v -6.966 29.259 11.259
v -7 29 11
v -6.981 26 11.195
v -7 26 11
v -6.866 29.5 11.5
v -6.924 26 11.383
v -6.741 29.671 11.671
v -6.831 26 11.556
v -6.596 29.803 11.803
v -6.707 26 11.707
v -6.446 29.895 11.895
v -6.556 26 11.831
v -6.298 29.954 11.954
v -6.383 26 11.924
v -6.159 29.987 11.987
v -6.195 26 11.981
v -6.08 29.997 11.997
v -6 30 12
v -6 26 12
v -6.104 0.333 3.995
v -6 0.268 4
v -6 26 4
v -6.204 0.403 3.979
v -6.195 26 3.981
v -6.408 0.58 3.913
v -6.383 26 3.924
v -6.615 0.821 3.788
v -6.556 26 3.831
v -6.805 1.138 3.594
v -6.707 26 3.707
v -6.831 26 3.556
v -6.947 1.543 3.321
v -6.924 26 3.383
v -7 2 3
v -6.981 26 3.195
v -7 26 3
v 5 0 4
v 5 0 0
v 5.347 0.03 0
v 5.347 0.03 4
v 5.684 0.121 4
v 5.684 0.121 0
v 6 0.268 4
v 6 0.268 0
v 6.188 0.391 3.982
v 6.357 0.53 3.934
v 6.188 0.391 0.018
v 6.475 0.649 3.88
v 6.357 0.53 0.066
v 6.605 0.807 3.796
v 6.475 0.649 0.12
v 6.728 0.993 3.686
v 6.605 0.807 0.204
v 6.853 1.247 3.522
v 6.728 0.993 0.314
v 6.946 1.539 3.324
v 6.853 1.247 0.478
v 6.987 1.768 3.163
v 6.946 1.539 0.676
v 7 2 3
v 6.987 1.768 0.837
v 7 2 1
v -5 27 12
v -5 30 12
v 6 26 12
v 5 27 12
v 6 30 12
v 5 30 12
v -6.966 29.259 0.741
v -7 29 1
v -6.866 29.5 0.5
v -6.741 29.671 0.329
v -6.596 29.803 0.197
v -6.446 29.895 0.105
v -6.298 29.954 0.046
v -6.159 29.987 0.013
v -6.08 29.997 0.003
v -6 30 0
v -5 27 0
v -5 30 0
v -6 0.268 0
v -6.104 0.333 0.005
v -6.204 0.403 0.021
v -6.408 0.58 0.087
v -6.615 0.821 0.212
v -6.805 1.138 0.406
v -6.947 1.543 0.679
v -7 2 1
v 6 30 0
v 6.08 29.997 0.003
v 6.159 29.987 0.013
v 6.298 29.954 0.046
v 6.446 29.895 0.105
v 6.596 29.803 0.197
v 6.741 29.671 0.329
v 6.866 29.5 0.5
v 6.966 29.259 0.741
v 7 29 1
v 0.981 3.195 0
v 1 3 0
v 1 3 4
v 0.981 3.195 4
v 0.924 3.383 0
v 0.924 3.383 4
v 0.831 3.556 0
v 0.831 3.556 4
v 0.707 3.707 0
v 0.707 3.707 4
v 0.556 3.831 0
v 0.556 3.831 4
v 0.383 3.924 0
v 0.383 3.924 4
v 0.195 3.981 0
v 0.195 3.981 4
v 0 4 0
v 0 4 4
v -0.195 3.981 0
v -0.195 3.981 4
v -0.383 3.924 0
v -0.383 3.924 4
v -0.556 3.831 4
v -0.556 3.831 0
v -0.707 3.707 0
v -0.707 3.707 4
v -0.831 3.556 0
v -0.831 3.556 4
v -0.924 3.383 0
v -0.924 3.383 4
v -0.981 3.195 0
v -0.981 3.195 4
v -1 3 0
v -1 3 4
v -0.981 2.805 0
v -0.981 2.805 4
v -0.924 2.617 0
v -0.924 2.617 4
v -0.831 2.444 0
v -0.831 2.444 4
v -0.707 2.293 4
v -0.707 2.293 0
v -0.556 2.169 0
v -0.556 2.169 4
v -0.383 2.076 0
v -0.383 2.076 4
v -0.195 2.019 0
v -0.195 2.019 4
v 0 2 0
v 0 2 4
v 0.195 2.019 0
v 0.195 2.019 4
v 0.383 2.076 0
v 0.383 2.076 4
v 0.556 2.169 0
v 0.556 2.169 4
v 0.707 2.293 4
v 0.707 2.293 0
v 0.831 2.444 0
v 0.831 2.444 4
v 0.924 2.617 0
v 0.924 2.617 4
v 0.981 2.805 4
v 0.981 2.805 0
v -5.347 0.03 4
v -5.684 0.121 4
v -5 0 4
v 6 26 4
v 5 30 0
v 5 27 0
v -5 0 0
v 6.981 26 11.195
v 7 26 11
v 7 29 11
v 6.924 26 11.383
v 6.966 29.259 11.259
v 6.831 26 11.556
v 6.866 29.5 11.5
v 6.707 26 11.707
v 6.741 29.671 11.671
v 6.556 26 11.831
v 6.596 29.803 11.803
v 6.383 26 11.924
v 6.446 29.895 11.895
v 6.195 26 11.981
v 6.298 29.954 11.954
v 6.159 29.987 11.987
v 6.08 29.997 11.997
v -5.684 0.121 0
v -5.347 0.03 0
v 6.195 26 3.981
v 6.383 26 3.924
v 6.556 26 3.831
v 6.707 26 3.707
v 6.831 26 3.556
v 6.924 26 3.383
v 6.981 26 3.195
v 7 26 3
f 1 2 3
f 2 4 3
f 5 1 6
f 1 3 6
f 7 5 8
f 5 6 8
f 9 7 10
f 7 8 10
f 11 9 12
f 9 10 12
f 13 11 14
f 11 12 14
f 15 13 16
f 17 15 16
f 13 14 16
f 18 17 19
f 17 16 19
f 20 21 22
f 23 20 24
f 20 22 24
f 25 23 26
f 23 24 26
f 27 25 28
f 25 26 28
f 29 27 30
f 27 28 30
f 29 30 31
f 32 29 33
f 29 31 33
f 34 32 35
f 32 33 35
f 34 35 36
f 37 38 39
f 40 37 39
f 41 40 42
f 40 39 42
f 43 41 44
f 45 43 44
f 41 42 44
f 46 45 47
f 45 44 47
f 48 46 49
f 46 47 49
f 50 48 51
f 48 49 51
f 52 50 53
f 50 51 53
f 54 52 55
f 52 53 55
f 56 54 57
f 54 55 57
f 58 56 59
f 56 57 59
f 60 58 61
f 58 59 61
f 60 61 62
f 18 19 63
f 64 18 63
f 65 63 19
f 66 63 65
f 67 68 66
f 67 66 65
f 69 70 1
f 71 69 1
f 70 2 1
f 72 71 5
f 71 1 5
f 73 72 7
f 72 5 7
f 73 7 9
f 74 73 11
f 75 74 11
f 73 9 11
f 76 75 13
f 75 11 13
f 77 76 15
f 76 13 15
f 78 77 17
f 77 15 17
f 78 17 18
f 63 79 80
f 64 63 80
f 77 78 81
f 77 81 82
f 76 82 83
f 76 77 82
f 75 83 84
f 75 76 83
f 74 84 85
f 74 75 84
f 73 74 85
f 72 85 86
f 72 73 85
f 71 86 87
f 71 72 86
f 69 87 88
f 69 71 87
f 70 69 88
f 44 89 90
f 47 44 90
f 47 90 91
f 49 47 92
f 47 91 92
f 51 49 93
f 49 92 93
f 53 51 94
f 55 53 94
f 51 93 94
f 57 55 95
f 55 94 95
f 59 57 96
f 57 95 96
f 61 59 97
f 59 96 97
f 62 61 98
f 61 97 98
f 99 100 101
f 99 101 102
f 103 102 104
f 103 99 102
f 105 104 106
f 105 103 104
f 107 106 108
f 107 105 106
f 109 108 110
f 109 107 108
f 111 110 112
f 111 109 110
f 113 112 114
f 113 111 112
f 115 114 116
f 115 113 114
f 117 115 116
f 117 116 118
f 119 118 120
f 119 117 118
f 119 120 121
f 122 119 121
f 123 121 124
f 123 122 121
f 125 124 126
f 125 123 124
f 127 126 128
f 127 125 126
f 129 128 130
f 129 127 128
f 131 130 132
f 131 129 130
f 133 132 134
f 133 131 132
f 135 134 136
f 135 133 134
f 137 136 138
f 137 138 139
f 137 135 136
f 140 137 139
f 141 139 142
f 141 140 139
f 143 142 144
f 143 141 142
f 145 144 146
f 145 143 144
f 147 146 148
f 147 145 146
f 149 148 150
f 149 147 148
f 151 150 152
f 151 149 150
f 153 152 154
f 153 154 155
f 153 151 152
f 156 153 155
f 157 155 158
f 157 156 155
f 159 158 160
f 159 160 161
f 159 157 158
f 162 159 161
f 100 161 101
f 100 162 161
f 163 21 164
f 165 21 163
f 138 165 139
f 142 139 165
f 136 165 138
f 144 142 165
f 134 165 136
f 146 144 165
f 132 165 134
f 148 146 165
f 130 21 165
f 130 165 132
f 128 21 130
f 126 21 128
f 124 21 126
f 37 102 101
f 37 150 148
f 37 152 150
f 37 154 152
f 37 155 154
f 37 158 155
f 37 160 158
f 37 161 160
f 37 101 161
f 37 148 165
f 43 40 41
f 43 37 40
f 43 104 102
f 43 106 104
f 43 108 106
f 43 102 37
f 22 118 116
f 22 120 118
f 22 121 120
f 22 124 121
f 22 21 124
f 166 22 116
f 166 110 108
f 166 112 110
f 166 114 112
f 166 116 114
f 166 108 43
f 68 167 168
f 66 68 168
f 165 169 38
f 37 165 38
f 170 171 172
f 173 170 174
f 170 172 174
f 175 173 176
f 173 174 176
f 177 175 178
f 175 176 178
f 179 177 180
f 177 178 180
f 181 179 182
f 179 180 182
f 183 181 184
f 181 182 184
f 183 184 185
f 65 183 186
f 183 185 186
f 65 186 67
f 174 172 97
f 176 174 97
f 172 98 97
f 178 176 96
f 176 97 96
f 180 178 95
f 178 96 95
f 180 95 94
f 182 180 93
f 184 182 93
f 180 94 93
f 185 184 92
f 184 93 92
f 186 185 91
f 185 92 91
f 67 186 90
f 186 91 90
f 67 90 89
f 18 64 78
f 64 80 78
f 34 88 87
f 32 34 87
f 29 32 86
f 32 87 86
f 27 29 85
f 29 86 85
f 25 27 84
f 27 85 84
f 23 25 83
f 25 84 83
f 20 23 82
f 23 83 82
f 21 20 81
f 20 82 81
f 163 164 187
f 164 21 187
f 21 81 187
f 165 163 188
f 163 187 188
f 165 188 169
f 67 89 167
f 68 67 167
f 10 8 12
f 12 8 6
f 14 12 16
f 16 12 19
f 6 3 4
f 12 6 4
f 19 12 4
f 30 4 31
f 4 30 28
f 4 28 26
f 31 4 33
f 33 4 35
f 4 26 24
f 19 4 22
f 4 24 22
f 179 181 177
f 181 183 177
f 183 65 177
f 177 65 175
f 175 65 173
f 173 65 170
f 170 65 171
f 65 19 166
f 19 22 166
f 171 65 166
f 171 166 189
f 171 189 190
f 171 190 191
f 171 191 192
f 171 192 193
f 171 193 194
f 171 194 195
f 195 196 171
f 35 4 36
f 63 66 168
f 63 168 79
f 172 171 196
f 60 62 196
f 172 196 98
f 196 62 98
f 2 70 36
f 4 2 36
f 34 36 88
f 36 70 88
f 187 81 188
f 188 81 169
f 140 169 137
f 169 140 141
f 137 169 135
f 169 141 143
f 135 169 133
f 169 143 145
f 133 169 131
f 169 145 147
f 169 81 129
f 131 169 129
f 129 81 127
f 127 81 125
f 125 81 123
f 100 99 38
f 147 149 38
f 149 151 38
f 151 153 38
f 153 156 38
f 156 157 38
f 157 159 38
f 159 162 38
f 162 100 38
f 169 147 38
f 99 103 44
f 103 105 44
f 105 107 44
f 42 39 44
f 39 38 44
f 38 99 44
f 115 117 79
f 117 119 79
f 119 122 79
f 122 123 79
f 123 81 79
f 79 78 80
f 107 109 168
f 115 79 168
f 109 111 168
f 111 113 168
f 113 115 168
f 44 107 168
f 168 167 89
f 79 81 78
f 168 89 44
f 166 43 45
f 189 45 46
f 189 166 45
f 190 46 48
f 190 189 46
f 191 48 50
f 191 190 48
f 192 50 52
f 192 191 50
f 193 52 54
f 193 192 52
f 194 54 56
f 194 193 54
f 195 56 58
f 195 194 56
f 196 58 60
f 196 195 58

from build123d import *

# Parameters (mm, degrees)
F0_W        = 14
F0_H        = 30
F0_R        = 1
F1_DEPTH    = 4
F3_DEPTH    = 8
F4_DEPTH    = 4.001
F5_R        = 1
F6_T1_DEPTH = 12


# Not quite as in the source:
# - a fillet or chamfer that OpenCascade refuses, or shapes differently, is made with other operations: its cross-section is extruded or revolved along the edge and cut away or added


with BuildPart() as f1:
    # F0 (on Top) → F1 (new body)
    with BuildSketch(Plane.XY):
        with Locations((0, 15)):
            Rectangle(F0_W, F0_H)
        with Locations((0, 3)):
            Circle(F0_R, mode=Mode.SUBTRACT)
    extrude(amount=F1_DEPTH)

    # F2 (on face) → F3 (join)
    with BuildSketch(Plane.XY.offset(4)):
        Polygon((-5, 27), (-5, 30), (-7, 30), (-7, 26), (7, 26), (7, 30), (5, 30), (5, 27), align=None)
    extrude(amount=F3_DEPTH)

    # F4 (cut, through all): a face of the model
    f4_faces = [f1.faces().sort_by_distance(p)[0] for p in [
        (0, 28.5, 4),
    ]]
    extrude(f4_faces, amount=-F4_DEPTH, mode=Mode.SUBTRACT)

    # F5
    f5_edges = [f1.edges().sort_by_distance(p)[0] for p in [
        (-7, 30, 6),
        (7, 30, 6),
        (-7, 28, 12),
        (7, 28, 12),
        (7, 15, 0),
        (-7, 15, 0),
        (-7, 13, 4),
        (7, 13, 4),
    ]]
    fillet(f5_edges, radius=F5_R)

    # F6: fillet of radius 2 on 2 edges, made by hand

    # F6_s2 → F6_t1 (cut)
    with BuildSketch(Plane.XY.offset(-4)):
        with BuildLine():
            ThreePointArc((-7, 2), (-6.4142135624, 0.5857864376), (-5, 0))
            Line((-5, 0), (-7, 0))
            Line((-7, 0), (-7, 2))
        make_face()
        with BuildLine():
            ThreePointArc((5, 0), (6.4142135624, 0.5857864376), (7, 2))
            Line((7, 2), (7, 0))
            Line((7, 0), (5, 0))
        make_face()
    extrude(amount=F6_T1_DEPTH, mode=Mode.SUBTRACT)


solid = f1.part
